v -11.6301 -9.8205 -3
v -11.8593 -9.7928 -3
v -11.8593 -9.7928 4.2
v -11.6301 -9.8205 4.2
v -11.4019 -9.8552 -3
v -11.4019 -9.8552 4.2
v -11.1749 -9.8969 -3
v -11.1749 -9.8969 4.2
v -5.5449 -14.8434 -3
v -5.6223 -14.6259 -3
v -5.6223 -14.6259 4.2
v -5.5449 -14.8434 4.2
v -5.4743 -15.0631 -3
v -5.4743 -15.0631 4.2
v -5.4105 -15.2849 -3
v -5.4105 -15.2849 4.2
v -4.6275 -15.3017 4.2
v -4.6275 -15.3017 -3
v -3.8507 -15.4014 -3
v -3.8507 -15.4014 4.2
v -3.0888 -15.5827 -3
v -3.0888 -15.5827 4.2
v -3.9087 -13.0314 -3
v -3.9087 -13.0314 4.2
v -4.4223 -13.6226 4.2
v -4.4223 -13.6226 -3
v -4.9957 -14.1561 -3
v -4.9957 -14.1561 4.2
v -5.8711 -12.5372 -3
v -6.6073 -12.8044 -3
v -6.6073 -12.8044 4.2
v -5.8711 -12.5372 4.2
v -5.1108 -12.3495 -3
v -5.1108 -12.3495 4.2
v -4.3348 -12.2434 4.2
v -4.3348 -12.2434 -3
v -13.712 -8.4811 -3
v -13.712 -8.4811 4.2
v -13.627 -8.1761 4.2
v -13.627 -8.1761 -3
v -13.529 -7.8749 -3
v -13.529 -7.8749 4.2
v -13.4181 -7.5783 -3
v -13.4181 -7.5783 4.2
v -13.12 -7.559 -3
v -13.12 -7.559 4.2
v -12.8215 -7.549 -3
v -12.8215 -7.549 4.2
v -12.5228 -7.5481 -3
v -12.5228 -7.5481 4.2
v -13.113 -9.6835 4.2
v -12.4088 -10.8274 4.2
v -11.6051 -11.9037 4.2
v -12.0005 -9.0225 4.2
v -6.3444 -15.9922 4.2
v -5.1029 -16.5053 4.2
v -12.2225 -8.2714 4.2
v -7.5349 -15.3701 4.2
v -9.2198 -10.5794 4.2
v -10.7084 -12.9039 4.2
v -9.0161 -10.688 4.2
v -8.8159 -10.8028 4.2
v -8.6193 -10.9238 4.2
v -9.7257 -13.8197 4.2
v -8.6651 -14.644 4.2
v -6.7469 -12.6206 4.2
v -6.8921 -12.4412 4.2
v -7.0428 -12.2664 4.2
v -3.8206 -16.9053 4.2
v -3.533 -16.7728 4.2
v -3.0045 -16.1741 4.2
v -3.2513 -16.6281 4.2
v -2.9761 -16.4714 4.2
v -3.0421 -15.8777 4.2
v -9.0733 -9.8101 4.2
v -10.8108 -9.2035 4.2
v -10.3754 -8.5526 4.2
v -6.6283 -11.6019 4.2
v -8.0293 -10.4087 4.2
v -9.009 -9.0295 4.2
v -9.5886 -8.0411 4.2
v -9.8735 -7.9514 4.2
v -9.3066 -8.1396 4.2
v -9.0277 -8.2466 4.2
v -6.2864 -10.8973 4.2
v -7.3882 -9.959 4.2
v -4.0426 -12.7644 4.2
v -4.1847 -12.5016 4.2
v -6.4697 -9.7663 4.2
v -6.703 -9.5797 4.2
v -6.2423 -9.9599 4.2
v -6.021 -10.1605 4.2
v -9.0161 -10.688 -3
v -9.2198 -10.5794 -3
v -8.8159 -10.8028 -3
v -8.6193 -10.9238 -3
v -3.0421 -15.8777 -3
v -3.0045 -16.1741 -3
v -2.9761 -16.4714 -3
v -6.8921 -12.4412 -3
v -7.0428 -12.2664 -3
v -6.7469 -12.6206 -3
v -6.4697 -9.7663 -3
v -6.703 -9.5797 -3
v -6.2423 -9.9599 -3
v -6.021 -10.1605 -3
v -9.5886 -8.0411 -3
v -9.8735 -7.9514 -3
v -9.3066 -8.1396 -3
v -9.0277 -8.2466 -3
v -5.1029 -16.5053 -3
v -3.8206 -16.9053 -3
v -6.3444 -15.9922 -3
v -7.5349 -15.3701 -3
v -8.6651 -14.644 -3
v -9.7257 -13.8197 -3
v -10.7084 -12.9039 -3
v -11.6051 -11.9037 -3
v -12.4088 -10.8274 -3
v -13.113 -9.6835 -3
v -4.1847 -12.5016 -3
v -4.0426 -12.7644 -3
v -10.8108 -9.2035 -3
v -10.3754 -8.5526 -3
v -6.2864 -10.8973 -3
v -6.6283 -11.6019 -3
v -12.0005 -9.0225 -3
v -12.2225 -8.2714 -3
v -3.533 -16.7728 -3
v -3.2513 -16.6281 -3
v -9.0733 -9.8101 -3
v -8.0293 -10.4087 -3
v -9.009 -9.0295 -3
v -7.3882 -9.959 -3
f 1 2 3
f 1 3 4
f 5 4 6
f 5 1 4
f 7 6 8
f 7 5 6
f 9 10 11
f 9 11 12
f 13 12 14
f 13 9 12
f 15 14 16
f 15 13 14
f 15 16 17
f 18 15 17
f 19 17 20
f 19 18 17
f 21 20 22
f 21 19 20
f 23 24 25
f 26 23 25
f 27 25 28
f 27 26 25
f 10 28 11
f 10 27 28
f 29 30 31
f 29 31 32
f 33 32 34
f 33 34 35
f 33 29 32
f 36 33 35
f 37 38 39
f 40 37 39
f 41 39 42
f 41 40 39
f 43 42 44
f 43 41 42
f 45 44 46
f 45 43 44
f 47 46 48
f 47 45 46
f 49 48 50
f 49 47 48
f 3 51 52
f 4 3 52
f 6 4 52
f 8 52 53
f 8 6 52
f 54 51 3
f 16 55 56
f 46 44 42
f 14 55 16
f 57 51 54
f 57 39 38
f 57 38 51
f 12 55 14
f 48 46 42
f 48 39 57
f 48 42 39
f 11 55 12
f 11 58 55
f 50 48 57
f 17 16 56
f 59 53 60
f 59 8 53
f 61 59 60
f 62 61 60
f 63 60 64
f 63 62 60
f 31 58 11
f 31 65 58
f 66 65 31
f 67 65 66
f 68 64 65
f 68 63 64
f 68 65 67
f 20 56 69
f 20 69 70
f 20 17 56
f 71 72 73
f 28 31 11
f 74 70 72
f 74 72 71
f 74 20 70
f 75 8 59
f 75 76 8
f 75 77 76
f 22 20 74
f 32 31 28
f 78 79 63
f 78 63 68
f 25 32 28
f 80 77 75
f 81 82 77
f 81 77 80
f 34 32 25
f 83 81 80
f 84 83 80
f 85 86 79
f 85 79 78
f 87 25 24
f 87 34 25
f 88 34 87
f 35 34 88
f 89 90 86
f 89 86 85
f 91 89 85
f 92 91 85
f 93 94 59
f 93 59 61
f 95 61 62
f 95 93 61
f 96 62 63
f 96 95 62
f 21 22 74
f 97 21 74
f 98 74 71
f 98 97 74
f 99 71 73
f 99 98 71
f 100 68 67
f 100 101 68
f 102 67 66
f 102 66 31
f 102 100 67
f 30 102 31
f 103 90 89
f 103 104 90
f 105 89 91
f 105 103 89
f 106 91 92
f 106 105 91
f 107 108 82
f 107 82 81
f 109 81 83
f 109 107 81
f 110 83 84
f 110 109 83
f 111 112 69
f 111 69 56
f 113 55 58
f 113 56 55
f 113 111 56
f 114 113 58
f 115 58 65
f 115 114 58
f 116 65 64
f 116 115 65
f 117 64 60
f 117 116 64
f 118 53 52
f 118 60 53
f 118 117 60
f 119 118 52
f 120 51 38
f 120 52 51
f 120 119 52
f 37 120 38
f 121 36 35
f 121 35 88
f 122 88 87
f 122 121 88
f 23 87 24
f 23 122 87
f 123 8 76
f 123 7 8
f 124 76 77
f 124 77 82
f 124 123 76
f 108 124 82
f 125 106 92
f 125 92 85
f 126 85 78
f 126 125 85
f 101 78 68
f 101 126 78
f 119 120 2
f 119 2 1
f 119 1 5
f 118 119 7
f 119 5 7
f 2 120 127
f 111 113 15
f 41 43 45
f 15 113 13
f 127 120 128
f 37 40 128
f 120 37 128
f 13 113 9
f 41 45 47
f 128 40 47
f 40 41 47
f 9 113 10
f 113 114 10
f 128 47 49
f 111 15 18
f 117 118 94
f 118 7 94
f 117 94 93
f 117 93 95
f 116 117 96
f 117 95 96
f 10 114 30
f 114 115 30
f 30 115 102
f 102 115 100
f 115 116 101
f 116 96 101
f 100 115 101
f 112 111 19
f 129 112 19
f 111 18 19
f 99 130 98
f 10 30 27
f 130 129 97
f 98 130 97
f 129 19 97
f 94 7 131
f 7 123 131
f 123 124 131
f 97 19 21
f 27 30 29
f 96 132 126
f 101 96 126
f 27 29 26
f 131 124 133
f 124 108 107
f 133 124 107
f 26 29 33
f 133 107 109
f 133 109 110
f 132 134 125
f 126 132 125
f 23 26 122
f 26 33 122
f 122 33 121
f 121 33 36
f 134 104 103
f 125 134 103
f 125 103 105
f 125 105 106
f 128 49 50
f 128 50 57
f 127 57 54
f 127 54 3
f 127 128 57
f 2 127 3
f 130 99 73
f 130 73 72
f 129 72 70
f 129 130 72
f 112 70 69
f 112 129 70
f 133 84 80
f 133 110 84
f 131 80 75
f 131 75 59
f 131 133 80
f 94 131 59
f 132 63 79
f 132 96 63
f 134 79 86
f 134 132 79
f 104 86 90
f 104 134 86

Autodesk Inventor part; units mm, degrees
ref_plane "YZ Plane" through (0, 0, 0) normal (1, 0, 0) x (0, 1, 0)
ref_plane "XZ Plane" through (0, 0, 0) normal (0, 1, 0) x (-1, 0, 0)
ref_plane "XY Plane" through (0, 0, 0) normal (0, 0, 1) x (1, 0, 0)
sketch "Szkic1" plane through (0, 0, 0) normal (0, 0, 1) x (1, 0, 0)
  arc A0 (-1.732, -4.0613) -> (-1.6613, -4.132) centre (0, -2.4) ccw projected
  arc A1 (0.05, -0.4006) -> (-0.05, -0.4006) centre (0, -2.4) ccw projected
  arc A2 (-0.05, -0.4006) -> (-0.5703, -0.483) centre (0, -2.4) ccw projected
  arc A3 (-0.5703, -0.483) -> (-0.6654, -0.5139) centre (0, -2.4) ccw projected
  arc A4 (-0.6654, -0.5139) -> (-1.1348, -0.7531) centre (0, -2.4) ccw projected
  arc A5 (-1.1348, -0.7531) -> (-1.2157, -0.8119) centre (0, -2.4) ccw projected
  arc A6 (-1.2157, -0.8119) -> (-1.5881, -1.1843) centre (0, -2.4) ccw projected
  arc A7 (-1.5881, -1.1843) -> (-1.6469, -1.2652) centre (0, -2.4) ccw projected
  arc A8 (-1.6469, -1.2652) -> (-1.8861, -1.7346) centre (0, -2.4) ccw projected
  arc A9 (-1.8861, -1.7346) -> (-1.917, -1.8297) centre (0, -2.4) ccw projected
  arc A10 (-1.917, -1.8297) -> (-1.9994, -2.35) centre (0, -2.4) ccw projected
  arc A11 (-1.9994, -2.35) -> (-1.9994, -2.45) centre (0, -2.4) ccw projected
  arc A12 (-1.9994, -2.45) -> (-1.917, -2.9703) centre (0, -2.4) ccw projected
  arc A13 (-1.917, -2.9703) -> (-1.8861, -3.0654) centre (0, -2.4) ccw projected
  arc A14 (-1.8861, -3.0654) -> (-1.6469, -3.5348) centre (0, -2.4) ccw projected
  arc A15 (-1.6469, -3.5348) -> (-1.5881, -3.6157) centre (0, -2.4) ccw projected
  arc A16 (-1.5881, -3.6157) -> (-1.2157, -3.9881) centre (0, -2.4) ccw projected
  arc A17 (-1.2157, -3.9881) -> (-1.1348, -4.0469) centre (0, -2.4) ccw projected
  arc A18 (-1.1348, -4.0469) -> (-0.6654, -4.2861) centre (0, -2.4) ccw projected
  arc A19 (-0.6654, -4.2861) -> (-0.5703, -4.317) centre (0, -2.4) ccw projected
  arc A20 (-0.5703, -4.317) -> (-0.05, -4.3994) centre (0, -2.4) ccw projected
  arc A21 (-0.05, -4.3994) -> (0.05, -4.3994) centre (0, -2.4) ccw projected
  arc A22 (0.05, -4.3994) -> (0.5703, -4.317) centre (0, -2.4) ccw projected
  arc A23 (0.5703, -4.317) -> (0.6654, -4.2861) centre (0, -2.4) ccw projected
  arc A24 (0.6654, -4.2861) -> (1.1348, -4.0469) centre (0, -2.4) ccw projected
  arc A25 (1.1348, -4.0469) -> (1.2157, -3.9881) centre (0, -2.4) ccw projected
  arc A26 (1.2157, -3.9881) -> (1.5881, -3.6157) centre (0, -2.4) ccw projected
  arc A27 (1.5881, -3.6157) -> (1.6469, -3.5348) centre (0, -2.4) ccw projected
  arc A28 (1.6469, -3.5348) -> (1.8861, -3.0654) centre (0, -2.4) ccw projected
  arc A29 (1.8861, -3.0654) -> (1.917, -2.9703) centre (0, -2.4) ccw projected
  arc A30 (1.917, -2.9703) -> (1.9994, -2.45) centre (0, -2.4) ccw projected
  arc A31 (1.9994, -2.45) -> (1.9994, -2.35) centre (0, -2.4) ccw projected
  arc A32 (1.9994, -2.35) -> (1.917, -1.8297) centre (0, -2.4) ccw projected
  arc A33 (1.917, -1.8297) -> (1.8861, -1.7346) centre (0, -2.4) ccw projected
  arc A34 (1.8861, -1.7346) -> (1.6469, -1.2652) centre (0, -2.4) ccw projected
  arc A35 (1.6469, -1.2652) -> (1.5881, -1.1843) centre (0, -2.4) ccw projected
  arc A36 (1.5881, -1.1843) -> (1.2157, -0.8119) centre (0, -2.4) ccw projected
  arc A37 (1.2157, -0.8119) -> (1.1348, -0.7531) centre (0, -2.4) ccw projected
  arc A38 (1.1348, -0.7531) -> (0.6654, -0.5139) centre (0, -2.4) ccw projected
  arc A39 (0.6654, -0.5139) -> (0.5703, -0.483) centre (0, -2.4) ccw projected
  arc A40 (0.5703, -0.483) -> (0.05, -0.4006) centre (0, -2.4) ccw projected
  circle A41 centre (0, -2.4) radius 1.5065 projected
  circle A42 centre (0, -2.4) radius 2.4
  circle A43 centre (0, -2.4) radius 15
  circle A44 centre (0, -2.4) radius 1.0065 projected
  circle A45 centre (0, -2.4) radius 1.2565
  circle A46 centre (0, -2.4) radius 2.9
  point P0 (0, 0)
  point P1 (-1.6613, -4.132)
  point P2 (-1.732, -4.0613)
  dimension "d0" = 30
  dimension "d3" = 0.25
  dimension "d12" = 0.5
extrude "Wyciągnięcie proste1" add sketch "Szkic1" against normal blind 3 contours A43
extrude "Wyciągnięcie proste2" add sketch "Szkic1" along normal blind 1.5 contours A42 A0 | A40 A39 A38 A37 A36 A35 A34 A33 A32 A31 A30 A29 A28 A27 A26 A25 A24 A23 A22 A21 A20 A19 A18 A17 A16 A15 A14 A13 A12 A11 A10 A9 A8 A7 A6 A5 A4 A3 A2 A1 | A41 | A43 | A45 | A46
sketch "Szkic2" plane through (0, -2.4, 1.5) normal (0, 0, 1) x (1, 0, 0)
  circle A0 centre (0, 0) radius 1.0065 projected
  circle A1 centre (0, 0) radius 3
  circle A2 centre (0, 0) radius 15 projected
  point P0 (0, 2.4)
  dimension "d6" = 6
extrude "Wyciągnięcie proste3" add sketch "Szkic2" along normal blind 2.7 contours A2
sketch "Szkic4" plane through (0, -2.4, -3) normal (0, 0, -1) x (-1, 0, 0)
  arc A0 (6.703, -7.1797) -> (6.021, -7.7605) centre (12.6436, -14.8459) ccw projected
  arc A1 (9.8735, -5.5514) -> (9.0277, -5.8466) centre (12.6436, -14.8459) ccw projected
  arc A2 (13.4181, -5.1783) -> (12.5228, -5.1481) centre (12.6436, -14.8459) ccw projected
  arc A3 (16.8582, -6.1109) -> (16.0342, -5.7593) centre (12.6436, -14.8459) ccw projected
  arc A4 (19.729, -8.2232) -> (19.0877, -7.5977) centre (12.6436, -14.8459) ccw projected
  arc A5 (21.6429, -11.23) -> (21.2709, -10.4151) centre (12.6436, -14.8459) ccw projected
  arc A6 (22.3415, -14.7251) -> (22.2889, -13.8308) centre (12.6436, -14.8459) ccw projected
  arc A7 (21.7302, -18.2365) -> (22.0043, -17.3836) centre (12.6436, -14.8459) ccw projected
  arc A8 (19.8918, -21.29) -> (20.4555, -20.5937) centre (12.6436, -14.8459) ccw projected
  arc A9 (3.9087, -10.6314) -> (5.6223, -12.2259) centre (9.734, -6.0892) ccw projected
  arc A10 (5.6223, -12.2259) -> (5.4105, -12.8849) centre (12.6436, -14.8459) ccw projected
  arc A11 (5.4105, -12.8849) -> (3.0888, -13.1827) centre (5.1774, -20.2681) ccw projected
  arc A12 (3.0888, -13.1827) -> (2.9761, -14.0714) centre (12.6436, -14.8459) ccw projected
  arc A13 (2.9761, -14.0714) -> (5.1499, -14.9393) centre (6.7672, -7.7316) ccw projected
  arc A14 (5.1499, -14.9393) -> (5.1905, -15.6303) centre (12.6436, -14.8459) ccw projected
  arc A15 (5.1905, -15.6303) -> (3.1332, -16.7466) centre (7.6403, -22.5991) ccw projected
  arc A16 (3.1332, -16.7466) -> (3.3491, -17.616) centre (12.6436, -14.8459) ccw projected
  arc A17 (3.3491, -17.616) -> (5.6897, -17.64) centre (4.594, -10.3348) ccw projected
  arc A18 (5.6897, -17.64) -> (5.9772, -18.2697) centre (12.6436, -14.8459) ccw projected
  arc A19 (5.9772, -18.2697) -> (4.462, -20.0539) centre (10.7789, -23.883) ccw projected
  arc A20 (4.462, -20.0539) -> (4.9774, -20.7866) centre (12.6436, -14.8459) ccw projected
  arc A21 (4.9774, -20.7866) -> (7.1686, -19.9634) centre (3.508, -13.5473) ccw projected
  arc A22 (7.1686, -19.9634) -> (7.6642, -20.4467) centre (12.6436, -14.8459) ccw projected
  arc A23 (7.6642, -20.4467) -> (6.8958, -22.6577) centre (14.1694, -23.9463) ccw projected
  arc A24 (6.8958, -22.6577) -> (7.6411, -23.1547) centre (12.6436, -14.8459) ccw projected
  arc A25 (7.6411, -23.1547) -> (9.387, -21.5956) centre (3.6558, -16.9352) ccw projected
  arc A26 (9.387, -21.5956) -> (10.0237, -21.8673) centre (12.6436, -14.8459) ccw projected
  arc A27 (10.0237, -21.8673) -> (10.1059, -24.2066) centre (17.3539, -22.7806) ccw projected
  arc A28 (10.1059, -24.2066) -> (10.9804, -24.4008) centre (12.6436, -14.8459) ccw projected
  arc A29 (10.9804, -24.4008) -> (12.0452, -22.3162) centre (5.0175, -20.0409) ccw projected
  arc A30 (12.0452, -22.3162) -> (12.737, -22.3396) centre (12.6436, -14.8459) ccw projected
  arc A31 (12.737, -22.3396) -> (13.6588, -24.4912) centre (19.9021, -20.5433) ccw projected
  arc A32 (13.6588, -24.4912) -> (14.5444, -24.3564) centre (12.6436, -14.8459) ccw projected
  arc A33 (14.5444, -24.3564) -> (14.7842, -22.028) centre (7.4091, -22.4449) ccw projected
  arc A34 (14.7842, -22.028) -> (15.4377, -21.7998) centre (12.6436, -14.8459) ccw projected
  arc A35 (15.4377, -21.7998) -> (17.0745, -23.4732) centre (21.4701, -17.5365) ccw projected
  arc A36 (17.0745, -23.4732) -> (17.8516, -23.0275) centre (12.6436, -14.8459) ccw projected
  arc A37 (17.8516, -23.0275) -> (17.2341, -20.7697) centre (10.5077, -23.8227) ccw projected
  arc A38 (17.2341, -20.7697) -> (17.7611, -20.3209) centre (12.6436, -14.8459) ccw projected
  arc A39 (17.7611, -20.3209) -> (19.8918, -21.29) centre (21.846, -14.1663) ccw projected
  arc A40 (20.4555, -20.5937) -> (19.0641, -18.7114) centre (13.8947, -23.9881) ccw projected
  arc A41 (19.0641, -18.7114) -> (19.3933, -18.1026) centre (12.6436, -14.8459) ccw projected
  arc A42 (19.3933, -18.1026) -> (21.7302, -18.2365) centre (20.9791, -10.8879) ccw projected
  arc A43 (22.0043, -17.3836) -> (20.0269, -16.1311) centre (17.1128, -22.9188) ccw projected
  arc A44 (20.0269, -16.1311) -> (20.114, -15.4444) centre (12.6436, -14.8459) ccw projected
  arc A45 (20.114, -15.4444) -> (22.3415, -14.7251) centre (18.9865, -8.1441) ccw projected
  arc A46 (22.2889, -13.8308) -> (19.9926, -13.3772) centre (19.7273, -20.7593) ccw projected
  arc A47 (19.9926, -13.3772) -> (19.8257, -12.7054) centre (12.6436, -14.8459) ccw projected
  arc A48 (19.8257, -12.7054) -> (21.6429, -11.23) centre (16.1372, -6.3053) ccw projected
  arc A49 (21.2709, -10.4151) -> (18.9658, -10.8216) centre (21.3851, -17.801) ccw projected
  arc A50 (18.9658, -10.8216) -> (18.5675, -10.2554) centre (12.6436, -14.8459) ccw projected
  arc A51 (18.5675, -10.2554) -> (19.729, -8.2232) centre (12.816, -5.6201) ccw projected
  arc A52 (19.0877, -7.5977) -> (17.0851, -8.8095) centre (21.8623, -14.4437) ccw projected
  arc A53 (17.0851, -8.8095) -> (16.5092, -8.4255) centre (12.6436, -14.8459) ccw projected
  arc A54 (16.5092, -8.4255) -> (16.8582, -6.1109) centre (9.4716, -6.1808) ccw projected
  arc A55 (16.0342, -5.7593) -> (14.6046, -7.6127) centre (21.0945, -11.1407) ccw projected
  arc A56 (14.6046, -7.6127) -> (13.9288, -7.4626) centre (12.6436, -14.8459) ccw projected
  arc A57 (13.9288, -7.4626) -> (13.4181, -5.1783) centre (6.5556, -7.9118) ccw projected
  arc A58 (12.5228, -5.1481) -> (11.8593, -7.3928) centre (19.1854, -8.3381) ccw projected
  arc A59 (11.8593, -7.3928) -> (11.1749, -7.4969) centre (12.6436, -14.8459) ccw projected
  arc A60 (11.1749, -7.4969) -> (9.8735, -5.5514) centre (4.4619, -10.5793) ccw projected
  arc A61 (9.0277, -5.8466) -> (9.2198, -8.1794) centre (16.3927, -6.4144) ccw projected
  arc A62 (9.2198, -8.1794) -> (8.6193, -8.5238) centre (12.6436, -14.8459) ccw projected
  arc A63 (8.6193, -8.5238) -> (6.703, -7.1797) centre (3.4731, -13.823) ccw projected
  arc A64 (6.021, -7.7605) -> (7.0428, -9.8664) centre (13.0938, -5.6294) ccw projected
  arc A65 (7.0428, -9.8664) -> (6.6073, -10.4044) centre (12.6436, -14.8459) ccw projected
  arc A66 (6.6073, -10.4044) -> (4.3348, -9.8434) centre (3.7228, -17.2049) ccw projected
  arc A67 (4.3348, -9.8434) -> (3.9087, -10.6314) centre (12.6436, -14.8459) ccw projected
  point P0 (0, 2.4)
  point P1 (0, 0)
extrude "Wyciągnięcie proste5" cut sketch "Szkic4" against normal blind 10 keep common part
properties part number "small-gear"
